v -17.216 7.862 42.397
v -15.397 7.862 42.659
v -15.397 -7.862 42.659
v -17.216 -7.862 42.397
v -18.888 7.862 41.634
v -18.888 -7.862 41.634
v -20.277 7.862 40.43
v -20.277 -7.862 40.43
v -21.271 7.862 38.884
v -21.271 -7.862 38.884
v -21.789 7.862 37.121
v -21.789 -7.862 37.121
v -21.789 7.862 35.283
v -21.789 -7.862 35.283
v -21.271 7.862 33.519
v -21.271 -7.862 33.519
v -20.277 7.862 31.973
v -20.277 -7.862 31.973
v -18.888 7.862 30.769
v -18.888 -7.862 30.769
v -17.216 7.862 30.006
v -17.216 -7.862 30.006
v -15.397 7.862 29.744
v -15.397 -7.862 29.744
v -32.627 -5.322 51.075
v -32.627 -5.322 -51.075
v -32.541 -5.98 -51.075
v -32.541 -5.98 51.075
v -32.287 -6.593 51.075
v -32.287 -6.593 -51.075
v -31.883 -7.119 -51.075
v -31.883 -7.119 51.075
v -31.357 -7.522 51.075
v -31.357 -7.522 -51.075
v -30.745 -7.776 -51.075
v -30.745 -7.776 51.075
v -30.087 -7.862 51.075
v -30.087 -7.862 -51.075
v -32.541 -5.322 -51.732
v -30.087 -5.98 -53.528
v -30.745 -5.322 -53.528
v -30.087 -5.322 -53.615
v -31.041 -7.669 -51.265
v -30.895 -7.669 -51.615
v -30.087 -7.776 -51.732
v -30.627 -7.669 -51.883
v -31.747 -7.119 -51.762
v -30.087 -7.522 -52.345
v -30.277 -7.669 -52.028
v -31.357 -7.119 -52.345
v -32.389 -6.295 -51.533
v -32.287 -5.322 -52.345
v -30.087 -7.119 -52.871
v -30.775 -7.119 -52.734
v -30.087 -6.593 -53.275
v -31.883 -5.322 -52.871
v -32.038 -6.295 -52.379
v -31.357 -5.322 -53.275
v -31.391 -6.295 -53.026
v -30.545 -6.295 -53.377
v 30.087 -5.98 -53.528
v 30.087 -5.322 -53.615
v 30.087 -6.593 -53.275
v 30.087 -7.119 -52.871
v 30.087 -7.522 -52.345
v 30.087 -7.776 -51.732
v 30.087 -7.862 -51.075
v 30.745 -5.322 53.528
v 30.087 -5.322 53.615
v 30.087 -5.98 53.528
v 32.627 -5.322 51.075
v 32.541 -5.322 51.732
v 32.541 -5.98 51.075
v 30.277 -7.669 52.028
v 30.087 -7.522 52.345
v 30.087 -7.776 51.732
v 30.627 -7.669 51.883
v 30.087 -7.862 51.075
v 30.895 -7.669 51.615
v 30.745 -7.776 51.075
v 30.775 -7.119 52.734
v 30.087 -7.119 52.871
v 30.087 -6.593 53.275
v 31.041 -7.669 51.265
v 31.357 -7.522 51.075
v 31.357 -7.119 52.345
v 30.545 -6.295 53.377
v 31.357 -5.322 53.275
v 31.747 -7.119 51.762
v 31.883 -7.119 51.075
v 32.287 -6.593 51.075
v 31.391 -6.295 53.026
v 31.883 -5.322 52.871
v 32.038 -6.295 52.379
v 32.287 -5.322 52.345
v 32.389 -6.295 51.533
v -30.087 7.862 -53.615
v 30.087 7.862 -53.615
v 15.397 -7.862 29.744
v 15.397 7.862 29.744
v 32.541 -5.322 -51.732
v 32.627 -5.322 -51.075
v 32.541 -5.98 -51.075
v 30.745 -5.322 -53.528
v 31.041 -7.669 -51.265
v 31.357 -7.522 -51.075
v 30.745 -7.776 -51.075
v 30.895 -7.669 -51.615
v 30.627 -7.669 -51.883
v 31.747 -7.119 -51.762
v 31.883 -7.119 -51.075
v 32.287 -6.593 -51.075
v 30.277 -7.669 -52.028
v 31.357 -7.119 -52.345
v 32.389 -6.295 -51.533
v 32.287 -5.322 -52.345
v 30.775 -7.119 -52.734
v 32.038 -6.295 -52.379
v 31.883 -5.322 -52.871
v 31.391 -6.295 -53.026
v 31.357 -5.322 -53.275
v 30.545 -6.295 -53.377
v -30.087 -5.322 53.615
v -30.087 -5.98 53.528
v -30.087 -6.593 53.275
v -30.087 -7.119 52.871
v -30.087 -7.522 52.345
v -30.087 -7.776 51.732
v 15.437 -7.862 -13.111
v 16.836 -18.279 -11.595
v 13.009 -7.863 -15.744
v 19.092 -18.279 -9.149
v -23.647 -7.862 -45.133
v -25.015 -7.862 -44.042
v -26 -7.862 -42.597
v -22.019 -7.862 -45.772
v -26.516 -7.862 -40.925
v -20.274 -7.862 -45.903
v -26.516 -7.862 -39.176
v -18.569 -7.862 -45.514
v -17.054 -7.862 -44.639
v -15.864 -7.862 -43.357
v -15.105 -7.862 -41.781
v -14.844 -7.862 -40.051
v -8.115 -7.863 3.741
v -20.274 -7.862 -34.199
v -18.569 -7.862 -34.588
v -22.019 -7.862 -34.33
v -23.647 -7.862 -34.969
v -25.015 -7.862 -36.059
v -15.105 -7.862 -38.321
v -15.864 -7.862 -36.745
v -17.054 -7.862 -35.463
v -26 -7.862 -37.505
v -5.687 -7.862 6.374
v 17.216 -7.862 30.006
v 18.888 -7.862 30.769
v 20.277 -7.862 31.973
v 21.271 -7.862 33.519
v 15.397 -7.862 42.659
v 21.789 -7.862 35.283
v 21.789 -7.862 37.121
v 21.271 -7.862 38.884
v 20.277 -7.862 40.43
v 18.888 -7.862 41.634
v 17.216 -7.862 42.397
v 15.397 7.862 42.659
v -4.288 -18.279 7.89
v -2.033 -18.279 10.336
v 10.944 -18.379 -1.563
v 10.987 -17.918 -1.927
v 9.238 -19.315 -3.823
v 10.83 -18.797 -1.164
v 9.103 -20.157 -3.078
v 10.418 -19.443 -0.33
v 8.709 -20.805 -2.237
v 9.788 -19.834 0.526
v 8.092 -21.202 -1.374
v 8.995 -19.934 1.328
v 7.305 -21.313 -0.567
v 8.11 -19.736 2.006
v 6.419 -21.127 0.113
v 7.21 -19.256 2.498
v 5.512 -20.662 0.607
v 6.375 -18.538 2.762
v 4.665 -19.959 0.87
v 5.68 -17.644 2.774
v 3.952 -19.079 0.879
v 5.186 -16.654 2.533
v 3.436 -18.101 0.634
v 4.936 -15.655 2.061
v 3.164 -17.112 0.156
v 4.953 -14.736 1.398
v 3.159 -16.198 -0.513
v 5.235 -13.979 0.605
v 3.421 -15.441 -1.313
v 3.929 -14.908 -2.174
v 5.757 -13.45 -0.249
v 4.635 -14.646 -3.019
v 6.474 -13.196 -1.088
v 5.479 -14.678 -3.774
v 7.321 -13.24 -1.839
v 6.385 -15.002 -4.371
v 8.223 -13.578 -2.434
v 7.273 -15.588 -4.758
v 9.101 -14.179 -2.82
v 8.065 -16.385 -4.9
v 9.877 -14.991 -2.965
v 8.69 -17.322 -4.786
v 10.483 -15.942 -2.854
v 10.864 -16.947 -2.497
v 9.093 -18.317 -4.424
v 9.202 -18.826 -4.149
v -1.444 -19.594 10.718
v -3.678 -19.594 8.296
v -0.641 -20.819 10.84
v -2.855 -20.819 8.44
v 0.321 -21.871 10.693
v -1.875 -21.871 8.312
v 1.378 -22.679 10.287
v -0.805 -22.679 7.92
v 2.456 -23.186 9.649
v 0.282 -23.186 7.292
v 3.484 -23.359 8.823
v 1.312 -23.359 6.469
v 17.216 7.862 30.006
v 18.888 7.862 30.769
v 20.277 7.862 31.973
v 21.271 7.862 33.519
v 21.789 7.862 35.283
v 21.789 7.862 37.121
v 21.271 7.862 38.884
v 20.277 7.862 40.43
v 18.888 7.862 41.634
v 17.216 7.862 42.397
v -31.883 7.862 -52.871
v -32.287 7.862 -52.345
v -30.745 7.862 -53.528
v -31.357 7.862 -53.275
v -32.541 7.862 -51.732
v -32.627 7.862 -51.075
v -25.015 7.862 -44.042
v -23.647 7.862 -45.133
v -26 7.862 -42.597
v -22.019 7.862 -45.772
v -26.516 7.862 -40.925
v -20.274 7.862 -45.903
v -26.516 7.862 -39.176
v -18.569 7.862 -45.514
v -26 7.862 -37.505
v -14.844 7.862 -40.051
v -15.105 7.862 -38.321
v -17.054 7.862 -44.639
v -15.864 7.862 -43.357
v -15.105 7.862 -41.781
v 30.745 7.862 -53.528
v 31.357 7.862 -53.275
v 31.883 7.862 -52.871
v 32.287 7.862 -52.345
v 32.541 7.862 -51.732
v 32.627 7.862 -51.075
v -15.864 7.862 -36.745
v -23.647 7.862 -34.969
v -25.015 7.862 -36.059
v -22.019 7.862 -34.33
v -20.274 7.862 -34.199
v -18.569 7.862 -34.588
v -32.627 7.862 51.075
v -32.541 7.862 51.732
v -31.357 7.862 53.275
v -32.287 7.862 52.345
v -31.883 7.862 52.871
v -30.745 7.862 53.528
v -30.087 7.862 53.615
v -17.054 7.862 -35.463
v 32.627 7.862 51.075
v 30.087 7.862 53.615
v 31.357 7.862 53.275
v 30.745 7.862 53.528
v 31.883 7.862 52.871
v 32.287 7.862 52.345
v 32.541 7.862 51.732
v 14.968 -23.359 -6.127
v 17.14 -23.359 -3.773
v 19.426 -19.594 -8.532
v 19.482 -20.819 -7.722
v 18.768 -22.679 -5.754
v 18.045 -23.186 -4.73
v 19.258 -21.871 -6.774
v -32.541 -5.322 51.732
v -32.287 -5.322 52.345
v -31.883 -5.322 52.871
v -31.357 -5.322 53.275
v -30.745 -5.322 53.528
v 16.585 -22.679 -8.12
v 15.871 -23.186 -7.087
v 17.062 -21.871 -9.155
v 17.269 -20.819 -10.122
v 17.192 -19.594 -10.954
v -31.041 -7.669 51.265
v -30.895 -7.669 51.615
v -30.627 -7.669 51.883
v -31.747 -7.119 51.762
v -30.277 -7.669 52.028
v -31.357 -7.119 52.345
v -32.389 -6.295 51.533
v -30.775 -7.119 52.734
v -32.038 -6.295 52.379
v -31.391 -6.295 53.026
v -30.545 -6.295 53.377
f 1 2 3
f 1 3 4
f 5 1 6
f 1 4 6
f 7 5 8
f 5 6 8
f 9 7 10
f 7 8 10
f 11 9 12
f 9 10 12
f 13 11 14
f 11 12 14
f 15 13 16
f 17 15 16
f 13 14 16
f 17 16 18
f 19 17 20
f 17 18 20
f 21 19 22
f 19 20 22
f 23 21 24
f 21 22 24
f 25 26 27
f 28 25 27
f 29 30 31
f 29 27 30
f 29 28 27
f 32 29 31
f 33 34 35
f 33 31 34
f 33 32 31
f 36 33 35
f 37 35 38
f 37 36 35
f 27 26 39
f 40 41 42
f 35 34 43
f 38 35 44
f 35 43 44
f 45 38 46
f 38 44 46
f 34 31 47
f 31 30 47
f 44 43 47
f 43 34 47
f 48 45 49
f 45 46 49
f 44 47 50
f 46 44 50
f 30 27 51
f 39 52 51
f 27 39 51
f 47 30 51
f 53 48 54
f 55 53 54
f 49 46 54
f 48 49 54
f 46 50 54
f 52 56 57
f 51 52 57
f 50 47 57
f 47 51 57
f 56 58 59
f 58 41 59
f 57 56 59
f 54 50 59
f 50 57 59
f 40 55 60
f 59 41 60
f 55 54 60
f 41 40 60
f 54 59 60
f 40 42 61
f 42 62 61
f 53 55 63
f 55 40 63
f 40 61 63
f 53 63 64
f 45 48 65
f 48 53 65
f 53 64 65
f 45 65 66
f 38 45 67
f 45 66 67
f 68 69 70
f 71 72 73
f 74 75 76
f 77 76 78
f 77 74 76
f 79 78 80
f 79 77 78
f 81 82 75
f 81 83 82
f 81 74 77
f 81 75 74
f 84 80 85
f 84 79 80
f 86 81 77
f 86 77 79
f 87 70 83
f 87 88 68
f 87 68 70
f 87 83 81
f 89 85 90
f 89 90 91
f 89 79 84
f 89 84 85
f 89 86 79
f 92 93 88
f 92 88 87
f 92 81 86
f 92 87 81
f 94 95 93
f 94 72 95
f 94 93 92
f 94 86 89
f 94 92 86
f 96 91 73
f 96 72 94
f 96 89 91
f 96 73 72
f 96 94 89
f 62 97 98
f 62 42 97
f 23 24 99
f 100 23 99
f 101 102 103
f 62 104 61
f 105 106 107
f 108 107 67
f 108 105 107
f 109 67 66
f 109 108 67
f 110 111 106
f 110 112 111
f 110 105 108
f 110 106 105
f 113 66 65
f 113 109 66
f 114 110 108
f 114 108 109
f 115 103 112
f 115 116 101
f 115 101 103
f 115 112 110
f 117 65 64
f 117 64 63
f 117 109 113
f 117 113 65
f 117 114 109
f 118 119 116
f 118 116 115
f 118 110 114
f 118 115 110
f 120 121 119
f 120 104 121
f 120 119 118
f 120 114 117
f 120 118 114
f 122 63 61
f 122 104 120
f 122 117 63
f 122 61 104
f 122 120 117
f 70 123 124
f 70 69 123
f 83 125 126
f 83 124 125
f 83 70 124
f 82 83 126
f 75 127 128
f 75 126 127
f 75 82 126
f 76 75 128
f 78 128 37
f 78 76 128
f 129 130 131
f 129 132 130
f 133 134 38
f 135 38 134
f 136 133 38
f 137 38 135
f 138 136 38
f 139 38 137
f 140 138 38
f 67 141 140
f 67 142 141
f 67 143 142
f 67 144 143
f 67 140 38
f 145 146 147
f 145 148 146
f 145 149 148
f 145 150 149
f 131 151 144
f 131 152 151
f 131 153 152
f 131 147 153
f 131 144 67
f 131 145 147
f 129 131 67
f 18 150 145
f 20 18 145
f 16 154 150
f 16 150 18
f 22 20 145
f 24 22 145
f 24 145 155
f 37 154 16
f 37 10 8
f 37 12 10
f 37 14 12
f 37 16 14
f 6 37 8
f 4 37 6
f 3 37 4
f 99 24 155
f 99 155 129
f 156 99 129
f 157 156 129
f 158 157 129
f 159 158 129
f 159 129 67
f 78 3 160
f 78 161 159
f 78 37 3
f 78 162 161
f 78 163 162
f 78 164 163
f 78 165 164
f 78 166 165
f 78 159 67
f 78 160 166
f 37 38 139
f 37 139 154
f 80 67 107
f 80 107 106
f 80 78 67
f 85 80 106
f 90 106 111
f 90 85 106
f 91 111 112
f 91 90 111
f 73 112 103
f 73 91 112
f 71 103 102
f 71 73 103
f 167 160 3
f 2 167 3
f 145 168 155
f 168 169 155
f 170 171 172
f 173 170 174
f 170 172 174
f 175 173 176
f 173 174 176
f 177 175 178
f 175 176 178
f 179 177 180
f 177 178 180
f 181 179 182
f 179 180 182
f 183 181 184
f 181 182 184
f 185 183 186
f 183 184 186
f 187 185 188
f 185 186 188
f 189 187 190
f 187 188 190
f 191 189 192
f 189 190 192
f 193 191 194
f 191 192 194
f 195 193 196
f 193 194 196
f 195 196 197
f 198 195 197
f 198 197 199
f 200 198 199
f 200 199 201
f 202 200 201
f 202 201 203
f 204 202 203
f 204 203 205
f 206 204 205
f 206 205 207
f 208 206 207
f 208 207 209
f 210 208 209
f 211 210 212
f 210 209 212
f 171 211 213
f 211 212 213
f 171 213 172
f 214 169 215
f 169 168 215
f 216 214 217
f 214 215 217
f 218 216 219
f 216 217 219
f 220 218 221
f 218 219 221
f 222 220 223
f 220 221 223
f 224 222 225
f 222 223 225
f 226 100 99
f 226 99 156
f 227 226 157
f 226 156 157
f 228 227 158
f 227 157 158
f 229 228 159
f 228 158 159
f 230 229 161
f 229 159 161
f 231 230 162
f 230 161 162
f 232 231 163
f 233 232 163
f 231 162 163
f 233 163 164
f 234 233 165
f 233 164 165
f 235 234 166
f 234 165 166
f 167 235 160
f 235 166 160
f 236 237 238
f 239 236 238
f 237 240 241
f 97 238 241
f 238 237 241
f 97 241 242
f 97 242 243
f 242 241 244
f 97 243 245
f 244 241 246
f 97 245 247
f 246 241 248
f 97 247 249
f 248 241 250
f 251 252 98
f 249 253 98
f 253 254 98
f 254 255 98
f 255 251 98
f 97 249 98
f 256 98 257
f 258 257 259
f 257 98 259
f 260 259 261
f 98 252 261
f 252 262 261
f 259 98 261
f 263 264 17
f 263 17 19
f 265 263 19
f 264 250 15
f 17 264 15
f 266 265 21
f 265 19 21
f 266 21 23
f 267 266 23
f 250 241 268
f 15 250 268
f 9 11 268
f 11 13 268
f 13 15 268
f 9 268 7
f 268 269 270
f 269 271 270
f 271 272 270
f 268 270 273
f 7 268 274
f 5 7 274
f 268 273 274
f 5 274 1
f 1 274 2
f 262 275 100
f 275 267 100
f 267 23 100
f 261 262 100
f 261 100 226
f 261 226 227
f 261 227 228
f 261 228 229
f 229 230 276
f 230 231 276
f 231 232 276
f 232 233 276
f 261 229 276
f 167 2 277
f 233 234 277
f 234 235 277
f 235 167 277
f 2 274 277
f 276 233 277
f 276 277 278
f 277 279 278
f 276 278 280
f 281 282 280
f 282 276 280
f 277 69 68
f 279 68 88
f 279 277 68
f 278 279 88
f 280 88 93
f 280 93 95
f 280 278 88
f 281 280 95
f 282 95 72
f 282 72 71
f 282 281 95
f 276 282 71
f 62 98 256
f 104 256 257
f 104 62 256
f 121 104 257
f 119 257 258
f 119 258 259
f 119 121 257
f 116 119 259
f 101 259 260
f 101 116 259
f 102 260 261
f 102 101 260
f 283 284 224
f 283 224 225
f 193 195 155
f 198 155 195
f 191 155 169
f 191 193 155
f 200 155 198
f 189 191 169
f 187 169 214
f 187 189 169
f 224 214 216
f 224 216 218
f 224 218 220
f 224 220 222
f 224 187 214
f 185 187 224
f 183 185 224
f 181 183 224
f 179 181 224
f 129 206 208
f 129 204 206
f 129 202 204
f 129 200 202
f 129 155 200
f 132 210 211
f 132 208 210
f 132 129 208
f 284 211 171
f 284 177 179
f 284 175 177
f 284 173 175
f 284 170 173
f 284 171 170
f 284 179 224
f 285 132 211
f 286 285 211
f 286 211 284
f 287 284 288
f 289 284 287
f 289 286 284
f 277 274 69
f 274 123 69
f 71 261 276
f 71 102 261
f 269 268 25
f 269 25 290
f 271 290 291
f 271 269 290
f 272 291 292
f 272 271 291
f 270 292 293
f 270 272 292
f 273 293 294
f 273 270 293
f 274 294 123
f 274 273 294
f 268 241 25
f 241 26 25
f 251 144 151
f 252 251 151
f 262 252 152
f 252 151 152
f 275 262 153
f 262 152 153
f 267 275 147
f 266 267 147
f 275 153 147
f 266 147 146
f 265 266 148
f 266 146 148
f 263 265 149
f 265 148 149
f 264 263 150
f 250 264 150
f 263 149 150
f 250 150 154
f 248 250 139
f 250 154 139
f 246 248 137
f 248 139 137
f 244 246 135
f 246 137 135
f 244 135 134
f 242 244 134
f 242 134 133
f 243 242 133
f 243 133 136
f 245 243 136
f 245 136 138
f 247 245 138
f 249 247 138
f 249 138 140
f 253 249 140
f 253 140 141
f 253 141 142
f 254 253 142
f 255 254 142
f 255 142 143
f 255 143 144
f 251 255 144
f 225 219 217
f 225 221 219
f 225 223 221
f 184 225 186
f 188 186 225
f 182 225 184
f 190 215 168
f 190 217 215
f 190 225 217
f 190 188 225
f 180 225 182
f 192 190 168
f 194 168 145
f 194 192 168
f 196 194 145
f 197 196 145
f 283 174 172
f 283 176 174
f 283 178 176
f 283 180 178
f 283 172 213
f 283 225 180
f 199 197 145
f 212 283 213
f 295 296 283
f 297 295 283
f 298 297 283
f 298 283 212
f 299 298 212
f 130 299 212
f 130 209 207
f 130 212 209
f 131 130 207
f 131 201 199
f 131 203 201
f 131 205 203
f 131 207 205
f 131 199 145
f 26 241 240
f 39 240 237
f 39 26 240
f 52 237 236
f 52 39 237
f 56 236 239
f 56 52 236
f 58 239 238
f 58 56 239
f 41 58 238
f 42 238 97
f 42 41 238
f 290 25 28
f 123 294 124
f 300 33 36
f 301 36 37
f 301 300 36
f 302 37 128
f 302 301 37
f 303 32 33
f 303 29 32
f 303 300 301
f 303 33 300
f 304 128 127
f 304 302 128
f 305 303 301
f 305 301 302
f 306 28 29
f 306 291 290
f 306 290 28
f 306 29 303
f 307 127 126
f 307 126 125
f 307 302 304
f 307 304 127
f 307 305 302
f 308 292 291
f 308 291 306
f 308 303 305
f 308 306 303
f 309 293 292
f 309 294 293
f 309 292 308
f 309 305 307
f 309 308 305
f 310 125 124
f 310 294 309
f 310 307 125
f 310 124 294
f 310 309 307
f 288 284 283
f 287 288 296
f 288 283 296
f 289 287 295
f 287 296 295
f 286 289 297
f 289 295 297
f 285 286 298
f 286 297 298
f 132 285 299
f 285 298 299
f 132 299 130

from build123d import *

# Parameters (mm, degrees)
F0_W      = 65.254434
F0_H      = 107.229896
F1_DEPTH  = 7.8625
F2_R      = 5.868431
F3_DEPTH  = 60.29137
F4_DEPTH  = 65.80453
F5_R      = 2.54
F9_DEPTH  = 14.36904
F10_R     = 5.08
F11_R     = 3.805573
F12_DEPTH = 5.85052


with BuildPart() as f1:
    # F0 (on Front) → F1 (new body, symmetric)
    with BuildSketch(Plane.XZ):
        Rectangle(F0_W, F0_H)
    extrude(amount=F1_DEPTH, both=True)

    # F2 (on face) → F3 (cut)
    with BuildSketch(Plane.XZ.offset(7.8625)):
        with BuildLine():
            Line((15.397114, 42.658772), (-15.397114, 42.658772))
            ThreePointArc((-15.397114, 42.658772), (-21.854338, 36.201548), (-15.397114, 29.744324))
            Line((-15.397114, 29.744324), (15.397114, 29.744324))
            ThreePointArc((15.397114, 29.744324), (21.854338, 36.201548), (15.397114, 42.658772))
        make_face()
        with Locations((-20.712784, -40.050827)):
            Circle(F2_R)
    extrude(amount=-F3_DEPTH, mode=Mode.SUBTRACT)

    # F2 (on face) → F4 (cut)
    with BuildSketch(Plane.XZ.offset(7.8625)):
        with BuildLine():
            Line((15.397114, 42.658772), (-15.397114, 42.658772))
            ThreePointArc((-15.397114, 42.658772), (-21.854338, 36.201548), (-15.397114, 29.744324))
            Line((-15.397114, 29.744324), (15.397114, 29.744324))
            ThreePointArc((15.397114, 29.744324), (21.854338, 36.201548), (15.397114, 42.658772))
        make_face()
        with Locations((-20.712784, -40.050827)):
            Circle(F2_R)
    extrude(amount=-F4_DEPTH, mode=Mode.SUBTRACT)

    # F5
    f5_edges = [f1.edges().sort_by_distance(p)[0] for p in [
        (-32.627217, 0, 53.614948),
        (32.627217, 0, 53.614948),
        (32.627217, 0, -53.614948),
        (-32.627217, 0, -53.614948),
        (-32.627217, -7.8625, 0),
        (0, -7.8625, 53.614948),
        (32.627217, -7.8625, 0),
        (0, -7.8625, -53.614948),
    ]]
    fillet(f5_edges, radius=F5_R)

    # F8 (on face) → F9 (join, symmetric)
    with BuildSketch(Plane(origin=(4.31292, 0, -3.978198), x_dir=(0, 1, 0), z_dir=(0.735055, 0, -0.678008))):
        Polygon((-6.416242, -3.535902), (-6.259087, 0), (-23.359215, 8.847466), (-23.359215, 5.644804), align=None)
    extrude(amount=F9_DEPTH, both=True)

    # F10
    f10_edges = [f1.edges().sort_by_distance(p)[0] for p in [
        (-1.336175, -23.359215, 11.090429),
        (19.787886, -23.359215, -8.394213),
    ]]
    fillet(f10_edges, radius=F10_R)

    # F11 (on face) → F12 (cut)
    with BuildSketch(Plane(origin=(-3.675446, -2.937391, -3.984694), x_dir=(0.802896, -0.353719, -0.479834), z_dir=(-0.596119, -0.476414, -0.646276))):
        with Locations((12.278191, 13.279027)):
            Circle(F11_R)
    extrude(amount=-F12_DEPTH, mode=Mode.SUBTRACT)


solid = f1.part
